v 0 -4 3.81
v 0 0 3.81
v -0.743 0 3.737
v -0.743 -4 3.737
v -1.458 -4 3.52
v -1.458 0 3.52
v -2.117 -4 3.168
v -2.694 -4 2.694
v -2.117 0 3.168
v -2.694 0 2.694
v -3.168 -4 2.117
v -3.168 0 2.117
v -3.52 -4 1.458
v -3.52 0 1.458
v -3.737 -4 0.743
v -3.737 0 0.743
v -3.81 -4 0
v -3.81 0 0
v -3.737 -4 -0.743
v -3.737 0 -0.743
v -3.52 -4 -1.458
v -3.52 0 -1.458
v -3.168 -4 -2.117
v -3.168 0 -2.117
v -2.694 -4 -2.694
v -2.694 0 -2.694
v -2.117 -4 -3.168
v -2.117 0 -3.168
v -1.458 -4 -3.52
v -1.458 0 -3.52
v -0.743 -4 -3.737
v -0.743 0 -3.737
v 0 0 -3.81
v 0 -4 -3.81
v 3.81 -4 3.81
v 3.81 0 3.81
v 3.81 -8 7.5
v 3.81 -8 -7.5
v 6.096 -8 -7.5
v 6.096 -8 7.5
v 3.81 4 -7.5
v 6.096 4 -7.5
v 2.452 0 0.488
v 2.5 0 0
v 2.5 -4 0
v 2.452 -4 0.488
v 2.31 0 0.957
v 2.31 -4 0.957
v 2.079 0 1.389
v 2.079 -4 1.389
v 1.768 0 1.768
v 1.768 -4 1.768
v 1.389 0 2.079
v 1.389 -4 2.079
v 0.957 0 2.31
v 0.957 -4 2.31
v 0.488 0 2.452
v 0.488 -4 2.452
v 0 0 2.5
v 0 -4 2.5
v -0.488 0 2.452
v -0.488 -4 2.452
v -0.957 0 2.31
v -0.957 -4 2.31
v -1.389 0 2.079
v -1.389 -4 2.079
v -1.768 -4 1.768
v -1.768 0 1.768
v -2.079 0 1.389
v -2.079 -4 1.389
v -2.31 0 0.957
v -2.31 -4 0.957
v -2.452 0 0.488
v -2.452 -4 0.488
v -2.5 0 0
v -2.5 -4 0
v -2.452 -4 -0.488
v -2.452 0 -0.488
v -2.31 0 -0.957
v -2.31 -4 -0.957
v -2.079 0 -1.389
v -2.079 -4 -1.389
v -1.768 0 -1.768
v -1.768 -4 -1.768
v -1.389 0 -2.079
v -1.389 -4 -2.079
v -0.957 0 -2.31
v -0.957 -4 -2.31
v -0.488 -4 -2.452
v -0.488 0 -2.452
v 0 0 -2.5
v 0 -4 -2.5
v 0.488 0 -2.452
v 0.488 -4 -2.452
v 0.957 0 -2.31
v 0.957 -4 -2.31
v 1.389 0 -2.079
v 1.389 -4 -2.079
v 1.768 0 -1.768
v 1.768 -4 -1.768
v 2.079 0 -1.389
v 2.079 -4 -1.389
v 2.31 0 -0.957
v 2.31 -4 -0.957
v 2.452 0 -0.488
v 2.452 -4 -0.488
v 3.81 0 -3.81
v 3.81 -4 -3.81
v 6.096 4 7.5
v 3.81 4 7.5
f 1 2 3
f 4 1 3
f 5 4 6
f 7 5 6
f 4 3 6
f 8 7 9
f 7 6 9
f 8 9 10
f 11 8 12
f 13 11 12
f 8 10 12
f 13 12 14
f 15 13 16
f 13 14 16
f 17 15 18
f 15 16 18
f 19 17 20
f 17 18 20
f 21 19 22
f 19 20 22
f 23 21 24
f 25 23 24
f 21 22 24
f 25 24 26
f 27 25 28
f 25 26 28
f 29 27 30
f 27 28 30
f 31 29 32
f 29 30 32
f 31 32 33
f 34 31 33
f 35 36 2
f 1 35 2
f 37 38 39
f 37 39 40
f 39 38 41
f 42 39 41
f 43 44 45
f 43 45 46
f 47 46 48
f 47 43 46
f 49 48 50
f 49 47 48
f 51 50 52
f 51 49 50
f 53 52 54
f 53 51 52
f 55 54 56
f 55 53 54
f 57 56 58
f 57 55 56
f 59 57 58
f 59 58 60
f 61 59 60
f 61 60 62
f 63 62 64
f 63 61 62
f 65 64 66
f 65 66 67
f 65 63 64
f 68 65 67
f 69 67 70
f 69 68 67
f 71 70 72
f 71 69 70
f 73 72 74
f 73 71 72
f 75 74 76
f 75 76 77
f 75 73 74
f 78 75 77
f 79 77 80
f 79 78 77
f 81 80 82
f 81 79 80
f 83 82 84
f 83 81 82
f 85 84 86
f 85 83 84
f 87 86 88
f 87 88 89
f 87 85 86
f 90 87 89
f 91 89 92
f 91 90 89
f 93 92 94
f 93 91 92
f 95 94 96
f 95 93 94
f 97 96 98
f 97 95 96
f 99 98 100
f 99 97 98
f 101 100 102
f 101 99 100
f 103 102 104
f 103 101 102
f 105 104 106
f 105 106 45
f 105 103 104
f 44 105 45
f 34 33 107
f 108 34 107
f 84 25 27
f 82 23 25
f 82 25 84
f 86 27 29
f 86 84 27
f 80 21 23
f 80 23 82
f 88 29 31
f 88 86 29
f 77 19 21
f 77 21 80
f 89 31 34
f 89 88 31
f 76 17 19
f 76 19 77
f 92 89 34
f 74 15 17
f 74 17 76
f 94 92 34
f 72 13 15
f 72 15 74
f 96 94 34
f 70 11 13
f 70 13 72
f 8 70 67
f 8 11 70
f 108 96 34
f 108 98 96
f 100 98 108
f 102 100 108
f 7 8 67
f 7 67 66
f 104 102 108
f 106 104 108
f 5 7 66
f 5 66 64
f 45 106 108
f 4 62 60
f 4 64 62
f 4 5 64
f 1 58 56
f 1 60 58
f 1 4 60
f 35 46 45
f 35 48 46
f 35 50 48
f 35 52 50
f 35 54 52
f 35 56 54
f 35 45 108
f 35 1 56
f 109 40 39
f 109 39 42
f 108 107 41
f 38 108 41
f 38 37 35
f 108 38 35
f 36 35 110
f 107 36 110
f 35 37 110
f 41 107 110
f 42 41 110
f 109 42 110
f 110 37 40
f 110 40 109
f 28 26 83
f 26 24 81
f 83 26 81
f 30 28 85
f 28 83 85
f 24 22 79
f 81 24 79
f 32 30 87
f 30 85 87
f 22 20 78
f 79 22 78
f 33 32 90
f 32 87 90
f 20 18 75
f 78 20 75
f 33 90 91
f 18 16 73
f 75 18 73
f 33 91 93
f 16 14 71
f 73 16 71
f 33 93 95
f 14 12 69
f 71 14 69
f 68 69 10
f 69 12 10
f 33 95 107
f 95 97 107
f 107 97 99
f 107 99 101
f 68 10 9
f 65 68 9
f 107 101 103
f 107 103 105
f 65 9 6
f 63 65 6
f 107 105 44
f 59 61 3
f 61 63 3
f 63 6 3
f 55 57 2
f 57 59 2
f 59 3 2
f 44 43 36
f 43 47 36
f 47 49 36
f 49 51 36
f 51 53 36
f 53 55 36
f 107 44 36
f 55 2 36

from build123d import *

# Parameters (mm, degrees)
F0_R     = 2.5
F1_DEPTH = 4
F2_W     = 12
F2_H     = 15
F3_DEPTH = 2.286


with BuildPart() as f1:
    # F0 (on Front) → F1 (new body)
    with BuildSketch(Plane.XZ):
        with BuildLine():
            Line((3.81, 3.81), (0, 3.81))
            ThreePointArc((0, 3.81), (-3.81, 0), (0, -3.81))
            Line((0, -3.81), (3.81, -3.81))
            Line((3.81, -3.81), (3.81, 3.81))
        make_face()
        Circle(F0_R, mode=Mode.SUBTRACT)
    extrude(amount=F1_DEPTH)

    # F2 (on face) → F3 (join)
    with BuildSketch(Plane.YZ.offset(3.81)):
        with Locations((-2, 0)):
            Rectangle(F2_W, F2_H)
    extrude(amount=F3_DEPTH)


solid = f1.part
